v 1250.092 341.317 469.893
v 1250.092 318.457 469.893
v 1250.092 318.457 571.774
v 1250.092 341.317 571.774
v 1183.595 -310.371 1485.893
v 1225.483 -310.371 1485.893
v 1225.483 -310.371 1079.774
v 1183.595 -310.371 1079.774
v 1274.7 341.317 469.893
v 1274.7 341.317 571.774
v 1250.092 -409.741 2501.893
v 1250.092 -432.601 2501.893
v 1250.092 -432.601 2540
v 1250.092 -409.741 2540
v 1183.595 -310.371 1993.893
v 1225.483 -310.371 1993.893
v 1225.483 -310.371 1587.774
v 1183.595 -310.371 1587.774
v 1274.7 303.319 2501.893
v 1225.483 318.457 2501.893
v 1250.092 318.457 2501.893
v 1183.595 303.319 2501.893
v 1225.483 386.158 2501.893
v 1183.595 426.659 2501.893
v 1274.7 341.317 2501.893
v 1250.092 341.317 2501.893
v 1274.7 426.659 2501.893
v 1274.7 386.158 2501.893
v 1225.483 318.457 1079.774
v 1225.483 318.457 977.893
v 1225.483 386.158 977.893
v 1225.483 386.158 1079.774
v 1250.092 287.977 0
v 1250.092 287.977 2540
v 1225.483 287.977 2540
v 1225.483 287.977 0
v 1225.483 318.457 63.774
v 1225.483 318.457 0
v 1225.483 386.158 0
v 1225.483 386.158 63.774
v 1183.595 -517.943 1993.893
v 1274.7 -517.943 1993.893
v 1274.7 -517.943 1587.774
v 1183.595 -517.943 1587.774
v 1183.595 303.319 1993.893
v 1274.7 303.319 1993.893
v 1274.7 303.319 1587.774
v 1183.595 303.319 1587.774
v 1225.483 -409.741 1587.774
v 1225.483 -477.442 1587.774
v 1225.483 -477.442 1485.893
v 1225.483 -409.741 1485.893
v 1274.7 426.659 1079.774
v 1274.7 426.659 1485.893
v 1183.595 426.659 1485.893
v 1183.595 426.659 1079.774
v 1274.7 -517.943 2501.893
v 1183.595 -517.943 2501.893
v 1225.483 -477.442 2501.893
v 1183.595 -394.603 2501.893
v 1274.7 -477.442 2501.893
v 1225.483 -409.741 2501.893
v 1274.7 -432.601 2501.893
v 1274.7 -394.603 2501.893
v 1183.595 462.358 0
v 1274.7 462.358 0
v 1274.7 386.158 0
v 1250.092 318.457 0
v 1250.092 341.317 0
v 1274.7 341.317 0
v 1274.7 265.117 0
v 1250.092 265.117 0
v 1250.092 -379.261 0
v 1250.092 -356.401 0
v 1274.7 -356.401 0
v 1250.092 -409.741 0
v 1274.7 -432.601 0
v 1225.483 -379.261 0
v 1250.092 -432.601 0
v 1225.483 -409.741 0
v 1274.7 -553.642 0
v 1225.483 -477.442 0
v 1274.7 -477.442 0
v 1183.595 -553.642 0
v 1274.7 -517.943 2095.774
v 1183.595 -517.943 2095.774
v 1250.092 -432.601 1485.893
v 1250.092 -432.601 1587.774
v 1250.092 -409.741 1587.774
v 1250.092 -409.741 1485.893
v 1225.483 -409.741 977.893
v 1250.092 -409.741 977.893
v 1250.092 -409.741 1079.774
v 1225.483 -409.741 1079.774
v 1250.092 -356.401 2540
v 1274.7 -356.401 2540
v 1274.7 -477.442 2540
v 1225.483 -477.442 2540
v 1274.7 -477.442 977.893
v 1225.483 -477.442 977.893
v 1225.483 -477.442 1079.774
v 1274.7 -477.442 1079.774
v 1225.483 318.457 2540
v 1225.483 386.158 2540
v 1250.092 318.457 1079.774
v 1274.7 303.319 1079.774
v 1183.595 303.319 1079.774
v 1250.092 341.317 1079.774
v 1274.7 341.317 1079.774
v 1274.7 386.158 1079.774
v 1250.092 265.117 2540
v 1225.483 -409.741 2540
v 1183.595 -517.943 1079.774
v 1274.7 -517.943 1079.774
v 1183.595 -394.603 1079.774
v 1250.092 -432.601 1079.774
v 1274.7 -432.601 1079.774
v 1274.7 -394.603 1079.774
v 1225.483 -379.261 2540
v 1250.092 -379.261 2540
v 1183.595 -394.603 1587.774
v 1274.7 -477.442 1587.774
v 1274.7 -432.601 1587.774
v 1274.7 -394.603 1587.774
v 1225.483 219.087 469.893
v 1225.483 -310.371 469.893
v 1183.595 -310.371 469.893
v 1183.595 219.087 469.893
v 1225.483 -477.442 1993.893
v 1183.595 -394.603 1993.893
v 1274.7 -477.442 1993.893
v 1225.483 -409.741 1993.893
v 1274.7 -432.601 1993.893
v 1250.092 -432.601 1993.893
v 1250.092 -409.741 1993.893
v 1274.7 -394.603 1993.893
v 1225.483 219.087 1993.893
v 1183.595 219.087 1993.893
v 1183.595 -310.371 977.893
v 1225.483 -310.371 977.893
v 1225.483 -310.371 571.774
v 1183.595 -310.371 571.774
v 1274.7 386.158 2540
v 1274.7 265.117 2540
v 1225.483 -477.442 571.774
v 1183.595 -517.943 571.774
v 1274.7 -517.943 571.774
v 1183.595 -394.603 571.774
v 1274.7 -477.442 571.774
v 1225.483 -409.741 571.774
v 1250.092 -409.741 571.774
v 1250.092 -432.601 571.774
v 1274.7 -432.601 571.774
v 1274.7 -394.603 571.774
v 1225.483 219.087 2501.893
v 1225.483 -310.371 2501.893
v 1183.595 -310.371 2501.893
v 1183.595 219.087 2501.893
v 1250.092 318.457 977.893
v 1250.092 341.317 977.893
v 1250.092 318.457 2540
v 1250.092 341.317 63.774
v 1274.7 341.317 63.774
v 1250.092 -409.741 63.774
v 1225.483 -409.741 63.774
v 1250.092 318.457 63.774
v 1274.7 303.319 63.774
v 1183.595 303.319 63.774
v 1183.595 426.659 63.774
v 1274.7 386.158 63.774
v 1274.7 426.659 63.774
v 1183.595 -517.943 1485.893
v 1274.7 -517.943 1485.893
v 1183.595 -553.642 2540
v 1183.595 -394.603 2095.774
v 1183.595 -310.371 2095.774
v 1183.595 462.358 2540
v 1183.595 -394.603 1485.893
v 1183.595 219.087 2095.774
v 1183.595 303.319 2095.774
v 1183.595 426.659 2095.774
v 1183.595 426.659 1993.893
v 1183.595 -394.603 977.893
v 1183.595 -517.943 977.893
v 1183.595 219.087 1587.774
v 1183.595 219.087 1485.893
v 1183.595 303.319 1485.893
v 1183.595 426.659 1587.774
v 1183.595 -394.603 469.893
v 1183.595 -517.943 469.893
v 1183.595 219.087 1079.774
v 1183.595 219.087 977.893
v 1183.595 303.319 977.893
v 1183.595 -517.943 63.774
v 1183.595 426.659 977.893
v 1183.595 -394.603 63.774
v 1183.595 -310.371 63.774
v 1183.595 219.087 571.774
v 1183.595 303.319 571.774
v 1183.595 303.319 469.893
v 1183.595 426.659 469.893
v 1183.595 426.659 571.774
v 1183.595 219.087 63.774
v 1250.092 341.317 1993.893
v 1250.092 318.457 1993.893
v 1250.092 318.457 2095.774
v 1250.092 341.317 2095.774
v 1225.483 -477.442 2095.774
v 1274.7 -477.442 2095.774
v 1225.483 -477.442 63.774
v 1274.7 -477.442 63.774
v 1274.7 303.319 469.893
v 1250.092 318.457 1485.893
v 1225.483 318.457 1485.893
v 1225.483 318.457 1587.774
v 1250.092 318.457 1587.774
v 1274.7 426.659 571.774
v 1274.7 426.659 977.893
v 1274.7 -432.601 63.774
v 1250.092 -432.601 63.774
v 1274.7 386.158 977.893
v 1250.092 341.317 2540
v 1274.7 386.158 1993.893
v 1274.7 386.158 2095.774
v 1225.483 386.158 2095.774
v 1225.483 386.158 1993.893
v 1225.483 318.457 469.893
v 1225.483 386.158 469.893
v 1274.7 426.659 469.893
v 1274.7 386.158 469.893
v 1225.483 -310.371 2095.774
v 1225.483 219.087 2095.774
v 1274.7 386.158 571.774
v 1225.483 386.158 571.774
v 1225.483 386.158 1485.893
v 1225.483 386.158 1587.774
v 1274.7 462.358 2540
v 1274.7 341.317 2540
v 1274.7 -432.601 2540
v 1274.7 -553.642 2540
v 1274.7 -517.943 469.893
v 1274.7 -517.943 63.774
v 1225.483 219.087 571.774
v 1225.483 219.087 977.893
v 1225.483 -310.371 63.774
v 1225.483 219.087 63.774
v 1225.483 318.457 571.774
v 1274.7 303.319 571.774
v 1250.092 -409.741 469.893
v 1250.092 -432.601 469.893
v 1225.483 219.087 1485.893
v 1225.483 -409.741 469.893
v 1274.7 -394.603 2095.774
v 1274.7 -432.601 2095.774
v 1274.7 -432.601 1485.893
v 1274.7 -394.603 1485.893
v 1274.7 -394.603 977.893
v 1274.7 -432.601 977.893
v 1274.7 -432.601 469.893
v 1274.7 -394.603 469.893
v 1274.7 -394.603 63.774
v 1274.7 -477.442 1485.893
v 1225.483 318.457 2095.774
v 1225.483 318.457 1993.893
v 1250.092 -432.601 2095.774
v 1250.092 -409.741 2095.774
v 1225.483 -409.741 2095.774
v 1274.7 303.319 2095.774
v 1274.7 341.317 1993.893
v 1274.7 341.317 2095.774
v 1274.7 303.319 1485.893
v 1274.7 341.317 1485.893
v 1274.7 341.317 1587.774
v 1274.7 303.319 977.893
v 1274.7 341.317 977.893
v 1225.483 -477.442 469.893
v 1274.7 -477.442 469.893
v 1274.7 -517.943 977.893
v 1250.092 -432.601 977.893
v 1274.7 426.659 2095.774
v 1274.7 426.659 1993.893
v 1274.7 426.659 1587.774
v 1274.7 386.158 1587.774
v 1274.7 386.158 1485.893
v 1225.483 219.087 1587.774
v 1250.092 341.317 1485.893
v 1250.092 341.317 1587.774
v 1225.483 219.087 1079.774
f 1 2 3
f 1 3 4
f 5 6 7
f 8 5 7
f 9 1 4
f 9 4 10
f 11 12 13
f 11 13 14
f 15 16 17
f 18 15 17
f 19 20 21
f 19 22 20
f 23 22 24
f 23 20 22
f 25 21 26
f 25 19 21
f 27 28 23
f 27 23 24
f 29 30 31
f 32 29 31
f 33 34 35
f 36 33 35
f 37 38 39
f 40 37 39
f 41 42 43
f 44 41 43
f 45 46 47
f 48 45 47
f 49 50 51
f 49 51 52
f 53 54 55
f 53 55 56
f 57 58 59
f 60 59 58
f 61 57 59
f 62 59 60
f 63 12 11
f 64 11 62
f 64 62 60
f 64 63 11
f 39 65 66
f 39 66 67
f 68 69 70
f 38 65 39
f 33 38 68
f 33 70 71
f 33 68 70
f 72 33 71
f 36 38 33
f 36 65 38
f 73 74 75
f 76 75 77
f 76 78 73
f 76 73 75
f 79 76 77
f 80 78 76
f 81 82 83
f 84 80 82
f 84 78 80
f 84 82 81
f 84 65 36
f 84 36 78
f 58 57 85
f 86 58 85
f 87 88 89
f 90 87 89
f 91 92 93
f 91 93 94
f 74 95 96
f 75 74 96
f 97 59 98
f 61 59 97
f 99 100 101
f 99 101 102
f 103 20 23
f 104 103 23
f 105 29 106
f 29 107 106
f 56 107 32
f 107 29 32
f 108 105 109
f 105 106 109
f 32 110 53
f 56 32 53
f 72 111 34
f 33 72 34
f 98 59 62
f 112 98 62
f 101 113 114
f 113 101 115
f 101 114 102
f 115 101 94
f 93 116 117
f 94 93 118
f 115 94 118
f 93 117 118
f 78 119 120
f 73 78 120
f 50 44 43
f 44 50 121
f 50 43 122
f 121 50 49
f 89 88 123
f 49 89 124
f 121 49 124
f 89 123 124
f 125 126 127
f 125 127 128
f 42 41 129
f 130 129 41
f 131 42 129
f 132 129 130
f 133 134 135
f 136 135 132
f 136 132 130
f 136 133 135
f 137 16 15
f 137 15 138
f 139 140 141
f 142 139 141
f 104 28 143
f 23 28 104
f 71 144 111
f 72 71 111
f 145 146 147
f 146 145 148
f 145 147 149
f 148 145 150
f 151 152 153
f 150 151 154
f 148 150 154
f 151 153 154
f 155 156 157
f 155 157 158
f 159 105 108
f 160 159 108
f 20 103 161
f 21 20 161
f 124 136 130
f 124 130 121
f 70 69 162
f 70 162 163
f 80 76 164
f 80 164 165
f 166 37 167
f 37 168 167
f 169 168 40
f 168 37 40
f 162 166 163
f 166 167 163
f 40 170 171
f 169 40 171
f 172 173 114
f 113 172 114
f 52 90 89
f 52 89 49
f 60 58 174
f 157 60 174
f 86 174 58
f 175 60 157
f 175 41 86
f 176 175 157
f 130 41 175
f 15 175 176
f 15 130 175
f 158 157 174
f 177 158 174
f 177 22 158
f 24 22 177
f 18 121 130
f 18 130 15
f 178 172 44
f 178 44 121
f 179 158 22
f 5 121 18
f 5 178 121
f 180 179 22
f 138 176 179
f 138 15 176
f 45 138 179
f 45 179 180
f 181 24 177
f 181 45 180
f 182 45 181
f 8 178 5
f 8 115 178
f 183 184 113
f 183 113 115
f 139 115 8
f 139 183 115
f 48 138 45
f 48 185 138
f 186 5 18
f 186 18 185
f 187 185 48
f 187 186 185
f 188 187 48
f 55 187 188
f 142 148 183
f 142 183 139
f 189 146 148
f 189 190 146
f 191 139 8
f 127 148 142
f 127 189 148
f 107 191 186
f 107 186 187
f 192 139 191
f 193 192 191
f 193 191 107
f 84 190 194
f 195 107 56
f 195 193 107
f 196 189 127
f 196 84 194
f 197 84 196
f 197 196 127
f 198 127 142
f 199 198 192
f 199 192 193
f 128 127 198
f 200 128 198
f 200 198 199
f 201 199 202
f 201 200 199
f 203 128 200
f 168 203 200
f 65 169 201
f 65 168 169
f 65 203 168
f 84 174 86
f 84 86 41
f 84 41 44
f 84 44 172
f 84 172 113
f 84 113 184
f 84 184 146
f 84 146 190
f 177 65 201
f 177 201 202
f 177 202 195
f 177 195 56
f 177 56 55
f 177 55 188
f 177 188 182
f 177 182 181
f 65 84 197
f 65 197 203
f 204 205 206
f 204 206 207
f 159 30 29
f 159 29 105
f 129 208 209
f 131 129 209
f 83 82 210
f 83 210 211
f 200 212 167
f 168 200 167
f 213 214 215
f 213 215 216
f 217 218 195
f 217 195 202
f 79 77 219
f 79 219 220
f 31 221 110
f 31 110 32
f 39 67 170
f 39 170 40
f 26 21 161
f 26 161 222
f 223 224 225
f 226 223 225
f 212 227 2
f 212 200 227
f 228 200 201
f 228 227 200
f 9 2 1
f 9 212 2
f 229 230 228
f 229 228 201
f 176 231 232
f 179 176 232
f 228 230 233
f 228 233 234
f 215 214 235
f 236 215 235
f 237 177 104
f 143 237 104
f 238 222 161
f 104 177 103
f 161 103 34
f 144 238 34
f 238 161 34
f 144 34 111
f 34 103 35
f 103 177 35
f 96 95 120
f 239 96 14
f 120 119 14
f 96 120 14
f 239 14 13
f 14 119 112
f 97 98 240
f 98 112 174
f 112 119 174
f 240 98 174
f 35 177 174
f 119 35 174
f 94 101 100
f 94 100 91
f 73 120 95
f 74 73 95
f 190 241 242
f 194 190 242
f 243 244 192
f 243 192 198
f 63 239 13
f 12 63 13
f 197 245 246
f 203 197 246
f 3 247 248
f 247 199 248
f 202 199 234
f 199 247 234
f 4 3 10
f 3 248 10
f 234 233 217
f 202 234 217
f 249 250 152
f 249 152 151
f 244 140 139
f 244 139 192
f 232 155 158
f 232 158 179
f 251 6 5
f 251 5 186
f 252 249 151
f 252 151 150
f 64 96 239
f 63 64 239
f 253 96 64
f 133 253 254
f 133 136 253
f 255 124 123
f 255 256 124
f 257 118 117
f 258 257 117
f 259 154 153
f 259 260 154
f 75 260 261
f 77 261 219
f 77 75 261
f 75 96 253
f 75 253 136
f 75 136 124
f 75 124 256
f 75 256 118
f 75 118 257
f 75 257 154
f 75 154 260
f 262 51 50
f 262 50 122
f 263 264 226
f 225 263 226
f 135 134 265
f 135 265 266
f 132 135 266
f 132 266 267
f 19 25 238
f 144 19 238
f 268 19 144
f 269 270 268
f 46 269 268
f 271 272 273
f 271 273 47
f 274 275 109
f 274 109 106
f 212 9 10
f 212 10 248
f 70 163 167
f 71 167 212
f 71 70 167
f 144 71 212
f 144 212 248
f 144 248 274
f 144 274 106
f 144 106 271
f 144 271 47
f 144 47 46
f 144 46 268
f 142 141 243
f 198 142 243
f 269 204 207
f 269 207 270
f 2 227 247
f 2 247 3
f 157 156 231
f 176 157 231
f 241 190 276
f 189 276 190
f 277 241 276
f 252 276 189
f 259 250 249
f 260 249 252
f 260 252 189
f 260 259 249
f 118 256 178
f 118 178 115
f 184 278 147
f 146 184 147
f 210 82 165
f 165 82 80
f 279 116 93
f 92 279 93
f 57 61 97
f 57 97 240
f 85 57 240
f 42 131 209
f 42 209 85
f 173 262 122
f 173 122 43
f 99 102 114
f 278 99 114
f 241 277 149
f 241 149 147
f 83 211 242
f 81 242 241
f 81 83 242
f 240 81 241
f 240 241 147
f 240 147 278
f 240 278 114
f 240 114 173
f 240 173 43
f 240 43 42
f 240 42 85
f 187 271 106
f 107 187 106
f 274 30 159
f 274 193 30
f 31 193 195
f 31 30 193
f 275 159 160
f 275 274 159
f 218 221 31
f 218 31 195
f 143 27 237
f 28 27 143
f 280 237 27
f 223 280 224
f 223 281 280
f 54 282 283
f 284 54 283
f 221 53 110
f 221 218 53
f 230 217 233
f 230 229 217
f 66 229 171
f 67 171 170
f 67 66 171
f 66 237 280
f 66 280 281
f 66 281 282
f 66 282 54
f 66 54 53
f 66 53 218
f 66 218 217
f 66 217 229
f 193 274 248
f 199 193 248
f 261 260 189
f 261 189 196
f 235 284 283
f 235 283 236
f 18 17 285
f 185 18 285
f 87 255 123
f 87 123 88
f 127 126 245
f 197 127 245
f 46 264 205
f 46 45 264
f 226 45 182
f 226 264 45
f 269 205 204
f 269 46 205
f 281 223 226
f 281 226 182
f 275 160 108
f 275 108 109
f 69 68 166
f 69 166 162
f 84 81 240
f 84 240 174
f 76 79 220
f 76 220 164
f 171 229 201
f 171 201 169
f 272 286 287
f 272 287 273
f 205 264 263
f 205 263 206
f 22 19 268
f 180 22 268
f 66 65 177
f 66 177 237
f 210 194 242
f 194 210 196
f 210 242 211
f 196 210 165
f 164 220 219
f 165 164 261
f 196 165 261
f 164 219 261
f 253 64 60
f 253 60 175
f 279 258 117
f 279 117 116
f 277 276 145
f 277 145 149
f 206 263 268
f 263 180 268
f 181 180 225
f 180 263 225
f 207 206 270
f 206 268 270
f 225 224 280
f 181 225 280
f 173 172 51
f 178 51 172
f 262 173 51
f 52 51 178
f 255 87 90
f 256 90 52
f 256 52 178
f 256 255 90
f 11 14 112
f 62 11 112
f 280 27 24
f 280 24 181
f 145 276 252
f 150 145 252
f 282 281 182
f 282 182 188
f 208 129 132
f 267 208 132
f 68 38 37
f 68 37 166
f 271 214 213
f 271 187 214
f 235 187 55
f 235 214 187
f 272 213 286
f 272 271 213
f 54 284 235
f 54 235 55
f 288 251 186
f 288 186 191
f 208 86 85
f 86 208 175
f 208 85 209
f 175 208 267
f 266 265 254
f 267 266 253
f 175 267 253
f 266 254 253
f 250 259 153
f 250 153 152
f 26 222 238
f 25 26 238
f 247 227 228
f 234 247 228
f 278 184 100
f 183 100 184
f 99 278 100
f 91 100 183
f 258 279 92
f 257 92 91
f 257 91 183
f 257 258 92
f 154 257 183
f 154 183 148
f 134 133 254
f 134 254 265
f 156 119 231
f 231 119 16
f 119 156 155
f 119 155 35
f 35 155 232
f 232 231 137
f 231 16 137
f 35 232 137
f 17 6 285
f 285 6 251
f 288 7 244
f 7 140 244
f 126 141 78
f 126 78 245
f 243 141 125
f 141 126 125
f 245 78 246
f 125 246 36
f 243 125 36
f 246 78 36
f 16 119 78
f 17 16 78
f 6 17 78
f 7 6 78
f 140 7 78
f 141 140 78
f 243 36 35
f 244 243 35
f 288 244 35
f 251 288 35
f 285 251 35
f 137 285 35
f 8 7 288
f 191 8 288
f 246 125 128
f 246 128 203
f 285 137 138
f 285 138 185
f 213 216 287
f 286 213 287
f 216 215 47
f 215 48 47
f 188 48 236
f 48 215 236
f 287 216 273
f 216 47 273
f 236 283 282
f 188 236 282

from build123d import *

# Parameters (mm, degrees)
EXTRUDE1_DEPTH = 2540
EXTRUDE2_START = 88.9
SKETCH2_W      = 406.11851991
SKETCH2_H      = 123.339698639
SKETCH2_H_2    = 529.458218549
EXTRUDE2_DEPTH = 2690.004184222


with BuildPart() as part:
    # Sketch1 → Extrude1 (new body)
    with BuildSketch(Plane(origin=(0, 0, 0), x_dir=(0, 1, 0), z_dir=(0, 0, 1))):
        Polygon((-379.260815056, -1250.091692764), (-356.400815056, -1250.091692764), (-356.400815056, -1274.700151443), (-432.600815056, -1274.700151443), (-432.600815056, -1250.091692764), (-409.740815056, -1250.091692764), (-409.740815056, -1225.483234085), (-432.600815056, -1225.483234085), (-477.441999719, -1225.483234085), (-477.441999719, -1274.700151443), (-553.641999719, -1274.700151443), (-553.641999719, -1183.595391403), (462.358000281, -1183.595391403), (462.358000281, -1274.700151443), (386.158000281, -1274.700151443), (386.158000281, -1225.483234085), (341.316815619, -1225.483234085), (318.456815619, -1225.483234085), (318.456815619, -1250.091692764), (341.316815619, -1250.091692764), (341.316815619, -1274.700151443), (265.116815619, -1274.700151443), (265.116815619, -1250.091692764), (287.976815619, -1250.091692764), (287.976815619, -1225.483234085), (265.116815619, -1225.483234085), (-356.400815056, -1225.483234085), (-379.260815056, -1225.483234085), align=None)
    extrude(amount=EXTRUDE1_DEPTH)

    # Sketch2 → Extrude2 (cut, through all)
    with BuildSketch(Plane(origin=(1225.483234085, 0, 0), x_dir=(0, 0, -1), z_dir=(1, 0, 0)).offset(EXTRUDE2_START)):
        with Locations((-1790.833583772, -456.272947628)):
            Rectangle(SKETCH2_W, SKETCH2_H)
        with Locations((-2298.833583772, -456.272947628)):
            Rectangle(SKETCH2_W, SKETCH2_H)
        with Locations((-2298.833583772, -45.641999719)):
            Rectangle(SKETCH2_W, SKETCH2_H_2)
        with Locations((-2298.833583772, 364.98894819)):
            Rectangle(SKETCH2_W, SKETCH2_H)
        with Locations((-1790.833583772, -45.641999719)):
            Rectangle(SKETCH2_W, SKETCH2_H_2)
        with Locations((-1790.833583772, 364.98894819)):
            Rectangle(SKETCH2_W, SKETCH2_H)
        with Locations((-1282.833583772, -456.272947628)):
            Rectangle(SKETCH2_W, SKETCH2_H)
        with Locations((-1282.833583772, -45.641999719)):
            Rectangle(SKETCH2_W, SKETCH2_H_2)
        with Locations((-1282.833583772, 364.98894819)):
            Rectangle(SKETCH2_W, SKETCH2_H)
        with Locations((-774.833583772, -456.272947628)):
            Rectangle(SKETCH2_W, SKETCH2_H)
        with Locations((-774.833583772, -45.641999719)):
            Rectangle(SKETCH2_W, SKETCH2_H_2)
        with Locations((-774.833583772, 364.98894819)):
            Rectangle(SKETCH2_W, SKETCH2_H)
        with Locations((-266.833583772, -456.272947628)):
            Rectangle(SKETCH2_W, SKETCH2_H)
        with Locations((-266.833583772, -45.641999719)):
            Rectangle(SKETCH2_W, SKETCH2_H_2)
        with Locations((-266.833583772, 364.98894819)):
            Rectangle(SKETCH2_W, SKETCH2_H)
    extrude(amount=-EXTRUDE2_DEPTH, mode=Mode.SUBTRACT)


solid = part.part
